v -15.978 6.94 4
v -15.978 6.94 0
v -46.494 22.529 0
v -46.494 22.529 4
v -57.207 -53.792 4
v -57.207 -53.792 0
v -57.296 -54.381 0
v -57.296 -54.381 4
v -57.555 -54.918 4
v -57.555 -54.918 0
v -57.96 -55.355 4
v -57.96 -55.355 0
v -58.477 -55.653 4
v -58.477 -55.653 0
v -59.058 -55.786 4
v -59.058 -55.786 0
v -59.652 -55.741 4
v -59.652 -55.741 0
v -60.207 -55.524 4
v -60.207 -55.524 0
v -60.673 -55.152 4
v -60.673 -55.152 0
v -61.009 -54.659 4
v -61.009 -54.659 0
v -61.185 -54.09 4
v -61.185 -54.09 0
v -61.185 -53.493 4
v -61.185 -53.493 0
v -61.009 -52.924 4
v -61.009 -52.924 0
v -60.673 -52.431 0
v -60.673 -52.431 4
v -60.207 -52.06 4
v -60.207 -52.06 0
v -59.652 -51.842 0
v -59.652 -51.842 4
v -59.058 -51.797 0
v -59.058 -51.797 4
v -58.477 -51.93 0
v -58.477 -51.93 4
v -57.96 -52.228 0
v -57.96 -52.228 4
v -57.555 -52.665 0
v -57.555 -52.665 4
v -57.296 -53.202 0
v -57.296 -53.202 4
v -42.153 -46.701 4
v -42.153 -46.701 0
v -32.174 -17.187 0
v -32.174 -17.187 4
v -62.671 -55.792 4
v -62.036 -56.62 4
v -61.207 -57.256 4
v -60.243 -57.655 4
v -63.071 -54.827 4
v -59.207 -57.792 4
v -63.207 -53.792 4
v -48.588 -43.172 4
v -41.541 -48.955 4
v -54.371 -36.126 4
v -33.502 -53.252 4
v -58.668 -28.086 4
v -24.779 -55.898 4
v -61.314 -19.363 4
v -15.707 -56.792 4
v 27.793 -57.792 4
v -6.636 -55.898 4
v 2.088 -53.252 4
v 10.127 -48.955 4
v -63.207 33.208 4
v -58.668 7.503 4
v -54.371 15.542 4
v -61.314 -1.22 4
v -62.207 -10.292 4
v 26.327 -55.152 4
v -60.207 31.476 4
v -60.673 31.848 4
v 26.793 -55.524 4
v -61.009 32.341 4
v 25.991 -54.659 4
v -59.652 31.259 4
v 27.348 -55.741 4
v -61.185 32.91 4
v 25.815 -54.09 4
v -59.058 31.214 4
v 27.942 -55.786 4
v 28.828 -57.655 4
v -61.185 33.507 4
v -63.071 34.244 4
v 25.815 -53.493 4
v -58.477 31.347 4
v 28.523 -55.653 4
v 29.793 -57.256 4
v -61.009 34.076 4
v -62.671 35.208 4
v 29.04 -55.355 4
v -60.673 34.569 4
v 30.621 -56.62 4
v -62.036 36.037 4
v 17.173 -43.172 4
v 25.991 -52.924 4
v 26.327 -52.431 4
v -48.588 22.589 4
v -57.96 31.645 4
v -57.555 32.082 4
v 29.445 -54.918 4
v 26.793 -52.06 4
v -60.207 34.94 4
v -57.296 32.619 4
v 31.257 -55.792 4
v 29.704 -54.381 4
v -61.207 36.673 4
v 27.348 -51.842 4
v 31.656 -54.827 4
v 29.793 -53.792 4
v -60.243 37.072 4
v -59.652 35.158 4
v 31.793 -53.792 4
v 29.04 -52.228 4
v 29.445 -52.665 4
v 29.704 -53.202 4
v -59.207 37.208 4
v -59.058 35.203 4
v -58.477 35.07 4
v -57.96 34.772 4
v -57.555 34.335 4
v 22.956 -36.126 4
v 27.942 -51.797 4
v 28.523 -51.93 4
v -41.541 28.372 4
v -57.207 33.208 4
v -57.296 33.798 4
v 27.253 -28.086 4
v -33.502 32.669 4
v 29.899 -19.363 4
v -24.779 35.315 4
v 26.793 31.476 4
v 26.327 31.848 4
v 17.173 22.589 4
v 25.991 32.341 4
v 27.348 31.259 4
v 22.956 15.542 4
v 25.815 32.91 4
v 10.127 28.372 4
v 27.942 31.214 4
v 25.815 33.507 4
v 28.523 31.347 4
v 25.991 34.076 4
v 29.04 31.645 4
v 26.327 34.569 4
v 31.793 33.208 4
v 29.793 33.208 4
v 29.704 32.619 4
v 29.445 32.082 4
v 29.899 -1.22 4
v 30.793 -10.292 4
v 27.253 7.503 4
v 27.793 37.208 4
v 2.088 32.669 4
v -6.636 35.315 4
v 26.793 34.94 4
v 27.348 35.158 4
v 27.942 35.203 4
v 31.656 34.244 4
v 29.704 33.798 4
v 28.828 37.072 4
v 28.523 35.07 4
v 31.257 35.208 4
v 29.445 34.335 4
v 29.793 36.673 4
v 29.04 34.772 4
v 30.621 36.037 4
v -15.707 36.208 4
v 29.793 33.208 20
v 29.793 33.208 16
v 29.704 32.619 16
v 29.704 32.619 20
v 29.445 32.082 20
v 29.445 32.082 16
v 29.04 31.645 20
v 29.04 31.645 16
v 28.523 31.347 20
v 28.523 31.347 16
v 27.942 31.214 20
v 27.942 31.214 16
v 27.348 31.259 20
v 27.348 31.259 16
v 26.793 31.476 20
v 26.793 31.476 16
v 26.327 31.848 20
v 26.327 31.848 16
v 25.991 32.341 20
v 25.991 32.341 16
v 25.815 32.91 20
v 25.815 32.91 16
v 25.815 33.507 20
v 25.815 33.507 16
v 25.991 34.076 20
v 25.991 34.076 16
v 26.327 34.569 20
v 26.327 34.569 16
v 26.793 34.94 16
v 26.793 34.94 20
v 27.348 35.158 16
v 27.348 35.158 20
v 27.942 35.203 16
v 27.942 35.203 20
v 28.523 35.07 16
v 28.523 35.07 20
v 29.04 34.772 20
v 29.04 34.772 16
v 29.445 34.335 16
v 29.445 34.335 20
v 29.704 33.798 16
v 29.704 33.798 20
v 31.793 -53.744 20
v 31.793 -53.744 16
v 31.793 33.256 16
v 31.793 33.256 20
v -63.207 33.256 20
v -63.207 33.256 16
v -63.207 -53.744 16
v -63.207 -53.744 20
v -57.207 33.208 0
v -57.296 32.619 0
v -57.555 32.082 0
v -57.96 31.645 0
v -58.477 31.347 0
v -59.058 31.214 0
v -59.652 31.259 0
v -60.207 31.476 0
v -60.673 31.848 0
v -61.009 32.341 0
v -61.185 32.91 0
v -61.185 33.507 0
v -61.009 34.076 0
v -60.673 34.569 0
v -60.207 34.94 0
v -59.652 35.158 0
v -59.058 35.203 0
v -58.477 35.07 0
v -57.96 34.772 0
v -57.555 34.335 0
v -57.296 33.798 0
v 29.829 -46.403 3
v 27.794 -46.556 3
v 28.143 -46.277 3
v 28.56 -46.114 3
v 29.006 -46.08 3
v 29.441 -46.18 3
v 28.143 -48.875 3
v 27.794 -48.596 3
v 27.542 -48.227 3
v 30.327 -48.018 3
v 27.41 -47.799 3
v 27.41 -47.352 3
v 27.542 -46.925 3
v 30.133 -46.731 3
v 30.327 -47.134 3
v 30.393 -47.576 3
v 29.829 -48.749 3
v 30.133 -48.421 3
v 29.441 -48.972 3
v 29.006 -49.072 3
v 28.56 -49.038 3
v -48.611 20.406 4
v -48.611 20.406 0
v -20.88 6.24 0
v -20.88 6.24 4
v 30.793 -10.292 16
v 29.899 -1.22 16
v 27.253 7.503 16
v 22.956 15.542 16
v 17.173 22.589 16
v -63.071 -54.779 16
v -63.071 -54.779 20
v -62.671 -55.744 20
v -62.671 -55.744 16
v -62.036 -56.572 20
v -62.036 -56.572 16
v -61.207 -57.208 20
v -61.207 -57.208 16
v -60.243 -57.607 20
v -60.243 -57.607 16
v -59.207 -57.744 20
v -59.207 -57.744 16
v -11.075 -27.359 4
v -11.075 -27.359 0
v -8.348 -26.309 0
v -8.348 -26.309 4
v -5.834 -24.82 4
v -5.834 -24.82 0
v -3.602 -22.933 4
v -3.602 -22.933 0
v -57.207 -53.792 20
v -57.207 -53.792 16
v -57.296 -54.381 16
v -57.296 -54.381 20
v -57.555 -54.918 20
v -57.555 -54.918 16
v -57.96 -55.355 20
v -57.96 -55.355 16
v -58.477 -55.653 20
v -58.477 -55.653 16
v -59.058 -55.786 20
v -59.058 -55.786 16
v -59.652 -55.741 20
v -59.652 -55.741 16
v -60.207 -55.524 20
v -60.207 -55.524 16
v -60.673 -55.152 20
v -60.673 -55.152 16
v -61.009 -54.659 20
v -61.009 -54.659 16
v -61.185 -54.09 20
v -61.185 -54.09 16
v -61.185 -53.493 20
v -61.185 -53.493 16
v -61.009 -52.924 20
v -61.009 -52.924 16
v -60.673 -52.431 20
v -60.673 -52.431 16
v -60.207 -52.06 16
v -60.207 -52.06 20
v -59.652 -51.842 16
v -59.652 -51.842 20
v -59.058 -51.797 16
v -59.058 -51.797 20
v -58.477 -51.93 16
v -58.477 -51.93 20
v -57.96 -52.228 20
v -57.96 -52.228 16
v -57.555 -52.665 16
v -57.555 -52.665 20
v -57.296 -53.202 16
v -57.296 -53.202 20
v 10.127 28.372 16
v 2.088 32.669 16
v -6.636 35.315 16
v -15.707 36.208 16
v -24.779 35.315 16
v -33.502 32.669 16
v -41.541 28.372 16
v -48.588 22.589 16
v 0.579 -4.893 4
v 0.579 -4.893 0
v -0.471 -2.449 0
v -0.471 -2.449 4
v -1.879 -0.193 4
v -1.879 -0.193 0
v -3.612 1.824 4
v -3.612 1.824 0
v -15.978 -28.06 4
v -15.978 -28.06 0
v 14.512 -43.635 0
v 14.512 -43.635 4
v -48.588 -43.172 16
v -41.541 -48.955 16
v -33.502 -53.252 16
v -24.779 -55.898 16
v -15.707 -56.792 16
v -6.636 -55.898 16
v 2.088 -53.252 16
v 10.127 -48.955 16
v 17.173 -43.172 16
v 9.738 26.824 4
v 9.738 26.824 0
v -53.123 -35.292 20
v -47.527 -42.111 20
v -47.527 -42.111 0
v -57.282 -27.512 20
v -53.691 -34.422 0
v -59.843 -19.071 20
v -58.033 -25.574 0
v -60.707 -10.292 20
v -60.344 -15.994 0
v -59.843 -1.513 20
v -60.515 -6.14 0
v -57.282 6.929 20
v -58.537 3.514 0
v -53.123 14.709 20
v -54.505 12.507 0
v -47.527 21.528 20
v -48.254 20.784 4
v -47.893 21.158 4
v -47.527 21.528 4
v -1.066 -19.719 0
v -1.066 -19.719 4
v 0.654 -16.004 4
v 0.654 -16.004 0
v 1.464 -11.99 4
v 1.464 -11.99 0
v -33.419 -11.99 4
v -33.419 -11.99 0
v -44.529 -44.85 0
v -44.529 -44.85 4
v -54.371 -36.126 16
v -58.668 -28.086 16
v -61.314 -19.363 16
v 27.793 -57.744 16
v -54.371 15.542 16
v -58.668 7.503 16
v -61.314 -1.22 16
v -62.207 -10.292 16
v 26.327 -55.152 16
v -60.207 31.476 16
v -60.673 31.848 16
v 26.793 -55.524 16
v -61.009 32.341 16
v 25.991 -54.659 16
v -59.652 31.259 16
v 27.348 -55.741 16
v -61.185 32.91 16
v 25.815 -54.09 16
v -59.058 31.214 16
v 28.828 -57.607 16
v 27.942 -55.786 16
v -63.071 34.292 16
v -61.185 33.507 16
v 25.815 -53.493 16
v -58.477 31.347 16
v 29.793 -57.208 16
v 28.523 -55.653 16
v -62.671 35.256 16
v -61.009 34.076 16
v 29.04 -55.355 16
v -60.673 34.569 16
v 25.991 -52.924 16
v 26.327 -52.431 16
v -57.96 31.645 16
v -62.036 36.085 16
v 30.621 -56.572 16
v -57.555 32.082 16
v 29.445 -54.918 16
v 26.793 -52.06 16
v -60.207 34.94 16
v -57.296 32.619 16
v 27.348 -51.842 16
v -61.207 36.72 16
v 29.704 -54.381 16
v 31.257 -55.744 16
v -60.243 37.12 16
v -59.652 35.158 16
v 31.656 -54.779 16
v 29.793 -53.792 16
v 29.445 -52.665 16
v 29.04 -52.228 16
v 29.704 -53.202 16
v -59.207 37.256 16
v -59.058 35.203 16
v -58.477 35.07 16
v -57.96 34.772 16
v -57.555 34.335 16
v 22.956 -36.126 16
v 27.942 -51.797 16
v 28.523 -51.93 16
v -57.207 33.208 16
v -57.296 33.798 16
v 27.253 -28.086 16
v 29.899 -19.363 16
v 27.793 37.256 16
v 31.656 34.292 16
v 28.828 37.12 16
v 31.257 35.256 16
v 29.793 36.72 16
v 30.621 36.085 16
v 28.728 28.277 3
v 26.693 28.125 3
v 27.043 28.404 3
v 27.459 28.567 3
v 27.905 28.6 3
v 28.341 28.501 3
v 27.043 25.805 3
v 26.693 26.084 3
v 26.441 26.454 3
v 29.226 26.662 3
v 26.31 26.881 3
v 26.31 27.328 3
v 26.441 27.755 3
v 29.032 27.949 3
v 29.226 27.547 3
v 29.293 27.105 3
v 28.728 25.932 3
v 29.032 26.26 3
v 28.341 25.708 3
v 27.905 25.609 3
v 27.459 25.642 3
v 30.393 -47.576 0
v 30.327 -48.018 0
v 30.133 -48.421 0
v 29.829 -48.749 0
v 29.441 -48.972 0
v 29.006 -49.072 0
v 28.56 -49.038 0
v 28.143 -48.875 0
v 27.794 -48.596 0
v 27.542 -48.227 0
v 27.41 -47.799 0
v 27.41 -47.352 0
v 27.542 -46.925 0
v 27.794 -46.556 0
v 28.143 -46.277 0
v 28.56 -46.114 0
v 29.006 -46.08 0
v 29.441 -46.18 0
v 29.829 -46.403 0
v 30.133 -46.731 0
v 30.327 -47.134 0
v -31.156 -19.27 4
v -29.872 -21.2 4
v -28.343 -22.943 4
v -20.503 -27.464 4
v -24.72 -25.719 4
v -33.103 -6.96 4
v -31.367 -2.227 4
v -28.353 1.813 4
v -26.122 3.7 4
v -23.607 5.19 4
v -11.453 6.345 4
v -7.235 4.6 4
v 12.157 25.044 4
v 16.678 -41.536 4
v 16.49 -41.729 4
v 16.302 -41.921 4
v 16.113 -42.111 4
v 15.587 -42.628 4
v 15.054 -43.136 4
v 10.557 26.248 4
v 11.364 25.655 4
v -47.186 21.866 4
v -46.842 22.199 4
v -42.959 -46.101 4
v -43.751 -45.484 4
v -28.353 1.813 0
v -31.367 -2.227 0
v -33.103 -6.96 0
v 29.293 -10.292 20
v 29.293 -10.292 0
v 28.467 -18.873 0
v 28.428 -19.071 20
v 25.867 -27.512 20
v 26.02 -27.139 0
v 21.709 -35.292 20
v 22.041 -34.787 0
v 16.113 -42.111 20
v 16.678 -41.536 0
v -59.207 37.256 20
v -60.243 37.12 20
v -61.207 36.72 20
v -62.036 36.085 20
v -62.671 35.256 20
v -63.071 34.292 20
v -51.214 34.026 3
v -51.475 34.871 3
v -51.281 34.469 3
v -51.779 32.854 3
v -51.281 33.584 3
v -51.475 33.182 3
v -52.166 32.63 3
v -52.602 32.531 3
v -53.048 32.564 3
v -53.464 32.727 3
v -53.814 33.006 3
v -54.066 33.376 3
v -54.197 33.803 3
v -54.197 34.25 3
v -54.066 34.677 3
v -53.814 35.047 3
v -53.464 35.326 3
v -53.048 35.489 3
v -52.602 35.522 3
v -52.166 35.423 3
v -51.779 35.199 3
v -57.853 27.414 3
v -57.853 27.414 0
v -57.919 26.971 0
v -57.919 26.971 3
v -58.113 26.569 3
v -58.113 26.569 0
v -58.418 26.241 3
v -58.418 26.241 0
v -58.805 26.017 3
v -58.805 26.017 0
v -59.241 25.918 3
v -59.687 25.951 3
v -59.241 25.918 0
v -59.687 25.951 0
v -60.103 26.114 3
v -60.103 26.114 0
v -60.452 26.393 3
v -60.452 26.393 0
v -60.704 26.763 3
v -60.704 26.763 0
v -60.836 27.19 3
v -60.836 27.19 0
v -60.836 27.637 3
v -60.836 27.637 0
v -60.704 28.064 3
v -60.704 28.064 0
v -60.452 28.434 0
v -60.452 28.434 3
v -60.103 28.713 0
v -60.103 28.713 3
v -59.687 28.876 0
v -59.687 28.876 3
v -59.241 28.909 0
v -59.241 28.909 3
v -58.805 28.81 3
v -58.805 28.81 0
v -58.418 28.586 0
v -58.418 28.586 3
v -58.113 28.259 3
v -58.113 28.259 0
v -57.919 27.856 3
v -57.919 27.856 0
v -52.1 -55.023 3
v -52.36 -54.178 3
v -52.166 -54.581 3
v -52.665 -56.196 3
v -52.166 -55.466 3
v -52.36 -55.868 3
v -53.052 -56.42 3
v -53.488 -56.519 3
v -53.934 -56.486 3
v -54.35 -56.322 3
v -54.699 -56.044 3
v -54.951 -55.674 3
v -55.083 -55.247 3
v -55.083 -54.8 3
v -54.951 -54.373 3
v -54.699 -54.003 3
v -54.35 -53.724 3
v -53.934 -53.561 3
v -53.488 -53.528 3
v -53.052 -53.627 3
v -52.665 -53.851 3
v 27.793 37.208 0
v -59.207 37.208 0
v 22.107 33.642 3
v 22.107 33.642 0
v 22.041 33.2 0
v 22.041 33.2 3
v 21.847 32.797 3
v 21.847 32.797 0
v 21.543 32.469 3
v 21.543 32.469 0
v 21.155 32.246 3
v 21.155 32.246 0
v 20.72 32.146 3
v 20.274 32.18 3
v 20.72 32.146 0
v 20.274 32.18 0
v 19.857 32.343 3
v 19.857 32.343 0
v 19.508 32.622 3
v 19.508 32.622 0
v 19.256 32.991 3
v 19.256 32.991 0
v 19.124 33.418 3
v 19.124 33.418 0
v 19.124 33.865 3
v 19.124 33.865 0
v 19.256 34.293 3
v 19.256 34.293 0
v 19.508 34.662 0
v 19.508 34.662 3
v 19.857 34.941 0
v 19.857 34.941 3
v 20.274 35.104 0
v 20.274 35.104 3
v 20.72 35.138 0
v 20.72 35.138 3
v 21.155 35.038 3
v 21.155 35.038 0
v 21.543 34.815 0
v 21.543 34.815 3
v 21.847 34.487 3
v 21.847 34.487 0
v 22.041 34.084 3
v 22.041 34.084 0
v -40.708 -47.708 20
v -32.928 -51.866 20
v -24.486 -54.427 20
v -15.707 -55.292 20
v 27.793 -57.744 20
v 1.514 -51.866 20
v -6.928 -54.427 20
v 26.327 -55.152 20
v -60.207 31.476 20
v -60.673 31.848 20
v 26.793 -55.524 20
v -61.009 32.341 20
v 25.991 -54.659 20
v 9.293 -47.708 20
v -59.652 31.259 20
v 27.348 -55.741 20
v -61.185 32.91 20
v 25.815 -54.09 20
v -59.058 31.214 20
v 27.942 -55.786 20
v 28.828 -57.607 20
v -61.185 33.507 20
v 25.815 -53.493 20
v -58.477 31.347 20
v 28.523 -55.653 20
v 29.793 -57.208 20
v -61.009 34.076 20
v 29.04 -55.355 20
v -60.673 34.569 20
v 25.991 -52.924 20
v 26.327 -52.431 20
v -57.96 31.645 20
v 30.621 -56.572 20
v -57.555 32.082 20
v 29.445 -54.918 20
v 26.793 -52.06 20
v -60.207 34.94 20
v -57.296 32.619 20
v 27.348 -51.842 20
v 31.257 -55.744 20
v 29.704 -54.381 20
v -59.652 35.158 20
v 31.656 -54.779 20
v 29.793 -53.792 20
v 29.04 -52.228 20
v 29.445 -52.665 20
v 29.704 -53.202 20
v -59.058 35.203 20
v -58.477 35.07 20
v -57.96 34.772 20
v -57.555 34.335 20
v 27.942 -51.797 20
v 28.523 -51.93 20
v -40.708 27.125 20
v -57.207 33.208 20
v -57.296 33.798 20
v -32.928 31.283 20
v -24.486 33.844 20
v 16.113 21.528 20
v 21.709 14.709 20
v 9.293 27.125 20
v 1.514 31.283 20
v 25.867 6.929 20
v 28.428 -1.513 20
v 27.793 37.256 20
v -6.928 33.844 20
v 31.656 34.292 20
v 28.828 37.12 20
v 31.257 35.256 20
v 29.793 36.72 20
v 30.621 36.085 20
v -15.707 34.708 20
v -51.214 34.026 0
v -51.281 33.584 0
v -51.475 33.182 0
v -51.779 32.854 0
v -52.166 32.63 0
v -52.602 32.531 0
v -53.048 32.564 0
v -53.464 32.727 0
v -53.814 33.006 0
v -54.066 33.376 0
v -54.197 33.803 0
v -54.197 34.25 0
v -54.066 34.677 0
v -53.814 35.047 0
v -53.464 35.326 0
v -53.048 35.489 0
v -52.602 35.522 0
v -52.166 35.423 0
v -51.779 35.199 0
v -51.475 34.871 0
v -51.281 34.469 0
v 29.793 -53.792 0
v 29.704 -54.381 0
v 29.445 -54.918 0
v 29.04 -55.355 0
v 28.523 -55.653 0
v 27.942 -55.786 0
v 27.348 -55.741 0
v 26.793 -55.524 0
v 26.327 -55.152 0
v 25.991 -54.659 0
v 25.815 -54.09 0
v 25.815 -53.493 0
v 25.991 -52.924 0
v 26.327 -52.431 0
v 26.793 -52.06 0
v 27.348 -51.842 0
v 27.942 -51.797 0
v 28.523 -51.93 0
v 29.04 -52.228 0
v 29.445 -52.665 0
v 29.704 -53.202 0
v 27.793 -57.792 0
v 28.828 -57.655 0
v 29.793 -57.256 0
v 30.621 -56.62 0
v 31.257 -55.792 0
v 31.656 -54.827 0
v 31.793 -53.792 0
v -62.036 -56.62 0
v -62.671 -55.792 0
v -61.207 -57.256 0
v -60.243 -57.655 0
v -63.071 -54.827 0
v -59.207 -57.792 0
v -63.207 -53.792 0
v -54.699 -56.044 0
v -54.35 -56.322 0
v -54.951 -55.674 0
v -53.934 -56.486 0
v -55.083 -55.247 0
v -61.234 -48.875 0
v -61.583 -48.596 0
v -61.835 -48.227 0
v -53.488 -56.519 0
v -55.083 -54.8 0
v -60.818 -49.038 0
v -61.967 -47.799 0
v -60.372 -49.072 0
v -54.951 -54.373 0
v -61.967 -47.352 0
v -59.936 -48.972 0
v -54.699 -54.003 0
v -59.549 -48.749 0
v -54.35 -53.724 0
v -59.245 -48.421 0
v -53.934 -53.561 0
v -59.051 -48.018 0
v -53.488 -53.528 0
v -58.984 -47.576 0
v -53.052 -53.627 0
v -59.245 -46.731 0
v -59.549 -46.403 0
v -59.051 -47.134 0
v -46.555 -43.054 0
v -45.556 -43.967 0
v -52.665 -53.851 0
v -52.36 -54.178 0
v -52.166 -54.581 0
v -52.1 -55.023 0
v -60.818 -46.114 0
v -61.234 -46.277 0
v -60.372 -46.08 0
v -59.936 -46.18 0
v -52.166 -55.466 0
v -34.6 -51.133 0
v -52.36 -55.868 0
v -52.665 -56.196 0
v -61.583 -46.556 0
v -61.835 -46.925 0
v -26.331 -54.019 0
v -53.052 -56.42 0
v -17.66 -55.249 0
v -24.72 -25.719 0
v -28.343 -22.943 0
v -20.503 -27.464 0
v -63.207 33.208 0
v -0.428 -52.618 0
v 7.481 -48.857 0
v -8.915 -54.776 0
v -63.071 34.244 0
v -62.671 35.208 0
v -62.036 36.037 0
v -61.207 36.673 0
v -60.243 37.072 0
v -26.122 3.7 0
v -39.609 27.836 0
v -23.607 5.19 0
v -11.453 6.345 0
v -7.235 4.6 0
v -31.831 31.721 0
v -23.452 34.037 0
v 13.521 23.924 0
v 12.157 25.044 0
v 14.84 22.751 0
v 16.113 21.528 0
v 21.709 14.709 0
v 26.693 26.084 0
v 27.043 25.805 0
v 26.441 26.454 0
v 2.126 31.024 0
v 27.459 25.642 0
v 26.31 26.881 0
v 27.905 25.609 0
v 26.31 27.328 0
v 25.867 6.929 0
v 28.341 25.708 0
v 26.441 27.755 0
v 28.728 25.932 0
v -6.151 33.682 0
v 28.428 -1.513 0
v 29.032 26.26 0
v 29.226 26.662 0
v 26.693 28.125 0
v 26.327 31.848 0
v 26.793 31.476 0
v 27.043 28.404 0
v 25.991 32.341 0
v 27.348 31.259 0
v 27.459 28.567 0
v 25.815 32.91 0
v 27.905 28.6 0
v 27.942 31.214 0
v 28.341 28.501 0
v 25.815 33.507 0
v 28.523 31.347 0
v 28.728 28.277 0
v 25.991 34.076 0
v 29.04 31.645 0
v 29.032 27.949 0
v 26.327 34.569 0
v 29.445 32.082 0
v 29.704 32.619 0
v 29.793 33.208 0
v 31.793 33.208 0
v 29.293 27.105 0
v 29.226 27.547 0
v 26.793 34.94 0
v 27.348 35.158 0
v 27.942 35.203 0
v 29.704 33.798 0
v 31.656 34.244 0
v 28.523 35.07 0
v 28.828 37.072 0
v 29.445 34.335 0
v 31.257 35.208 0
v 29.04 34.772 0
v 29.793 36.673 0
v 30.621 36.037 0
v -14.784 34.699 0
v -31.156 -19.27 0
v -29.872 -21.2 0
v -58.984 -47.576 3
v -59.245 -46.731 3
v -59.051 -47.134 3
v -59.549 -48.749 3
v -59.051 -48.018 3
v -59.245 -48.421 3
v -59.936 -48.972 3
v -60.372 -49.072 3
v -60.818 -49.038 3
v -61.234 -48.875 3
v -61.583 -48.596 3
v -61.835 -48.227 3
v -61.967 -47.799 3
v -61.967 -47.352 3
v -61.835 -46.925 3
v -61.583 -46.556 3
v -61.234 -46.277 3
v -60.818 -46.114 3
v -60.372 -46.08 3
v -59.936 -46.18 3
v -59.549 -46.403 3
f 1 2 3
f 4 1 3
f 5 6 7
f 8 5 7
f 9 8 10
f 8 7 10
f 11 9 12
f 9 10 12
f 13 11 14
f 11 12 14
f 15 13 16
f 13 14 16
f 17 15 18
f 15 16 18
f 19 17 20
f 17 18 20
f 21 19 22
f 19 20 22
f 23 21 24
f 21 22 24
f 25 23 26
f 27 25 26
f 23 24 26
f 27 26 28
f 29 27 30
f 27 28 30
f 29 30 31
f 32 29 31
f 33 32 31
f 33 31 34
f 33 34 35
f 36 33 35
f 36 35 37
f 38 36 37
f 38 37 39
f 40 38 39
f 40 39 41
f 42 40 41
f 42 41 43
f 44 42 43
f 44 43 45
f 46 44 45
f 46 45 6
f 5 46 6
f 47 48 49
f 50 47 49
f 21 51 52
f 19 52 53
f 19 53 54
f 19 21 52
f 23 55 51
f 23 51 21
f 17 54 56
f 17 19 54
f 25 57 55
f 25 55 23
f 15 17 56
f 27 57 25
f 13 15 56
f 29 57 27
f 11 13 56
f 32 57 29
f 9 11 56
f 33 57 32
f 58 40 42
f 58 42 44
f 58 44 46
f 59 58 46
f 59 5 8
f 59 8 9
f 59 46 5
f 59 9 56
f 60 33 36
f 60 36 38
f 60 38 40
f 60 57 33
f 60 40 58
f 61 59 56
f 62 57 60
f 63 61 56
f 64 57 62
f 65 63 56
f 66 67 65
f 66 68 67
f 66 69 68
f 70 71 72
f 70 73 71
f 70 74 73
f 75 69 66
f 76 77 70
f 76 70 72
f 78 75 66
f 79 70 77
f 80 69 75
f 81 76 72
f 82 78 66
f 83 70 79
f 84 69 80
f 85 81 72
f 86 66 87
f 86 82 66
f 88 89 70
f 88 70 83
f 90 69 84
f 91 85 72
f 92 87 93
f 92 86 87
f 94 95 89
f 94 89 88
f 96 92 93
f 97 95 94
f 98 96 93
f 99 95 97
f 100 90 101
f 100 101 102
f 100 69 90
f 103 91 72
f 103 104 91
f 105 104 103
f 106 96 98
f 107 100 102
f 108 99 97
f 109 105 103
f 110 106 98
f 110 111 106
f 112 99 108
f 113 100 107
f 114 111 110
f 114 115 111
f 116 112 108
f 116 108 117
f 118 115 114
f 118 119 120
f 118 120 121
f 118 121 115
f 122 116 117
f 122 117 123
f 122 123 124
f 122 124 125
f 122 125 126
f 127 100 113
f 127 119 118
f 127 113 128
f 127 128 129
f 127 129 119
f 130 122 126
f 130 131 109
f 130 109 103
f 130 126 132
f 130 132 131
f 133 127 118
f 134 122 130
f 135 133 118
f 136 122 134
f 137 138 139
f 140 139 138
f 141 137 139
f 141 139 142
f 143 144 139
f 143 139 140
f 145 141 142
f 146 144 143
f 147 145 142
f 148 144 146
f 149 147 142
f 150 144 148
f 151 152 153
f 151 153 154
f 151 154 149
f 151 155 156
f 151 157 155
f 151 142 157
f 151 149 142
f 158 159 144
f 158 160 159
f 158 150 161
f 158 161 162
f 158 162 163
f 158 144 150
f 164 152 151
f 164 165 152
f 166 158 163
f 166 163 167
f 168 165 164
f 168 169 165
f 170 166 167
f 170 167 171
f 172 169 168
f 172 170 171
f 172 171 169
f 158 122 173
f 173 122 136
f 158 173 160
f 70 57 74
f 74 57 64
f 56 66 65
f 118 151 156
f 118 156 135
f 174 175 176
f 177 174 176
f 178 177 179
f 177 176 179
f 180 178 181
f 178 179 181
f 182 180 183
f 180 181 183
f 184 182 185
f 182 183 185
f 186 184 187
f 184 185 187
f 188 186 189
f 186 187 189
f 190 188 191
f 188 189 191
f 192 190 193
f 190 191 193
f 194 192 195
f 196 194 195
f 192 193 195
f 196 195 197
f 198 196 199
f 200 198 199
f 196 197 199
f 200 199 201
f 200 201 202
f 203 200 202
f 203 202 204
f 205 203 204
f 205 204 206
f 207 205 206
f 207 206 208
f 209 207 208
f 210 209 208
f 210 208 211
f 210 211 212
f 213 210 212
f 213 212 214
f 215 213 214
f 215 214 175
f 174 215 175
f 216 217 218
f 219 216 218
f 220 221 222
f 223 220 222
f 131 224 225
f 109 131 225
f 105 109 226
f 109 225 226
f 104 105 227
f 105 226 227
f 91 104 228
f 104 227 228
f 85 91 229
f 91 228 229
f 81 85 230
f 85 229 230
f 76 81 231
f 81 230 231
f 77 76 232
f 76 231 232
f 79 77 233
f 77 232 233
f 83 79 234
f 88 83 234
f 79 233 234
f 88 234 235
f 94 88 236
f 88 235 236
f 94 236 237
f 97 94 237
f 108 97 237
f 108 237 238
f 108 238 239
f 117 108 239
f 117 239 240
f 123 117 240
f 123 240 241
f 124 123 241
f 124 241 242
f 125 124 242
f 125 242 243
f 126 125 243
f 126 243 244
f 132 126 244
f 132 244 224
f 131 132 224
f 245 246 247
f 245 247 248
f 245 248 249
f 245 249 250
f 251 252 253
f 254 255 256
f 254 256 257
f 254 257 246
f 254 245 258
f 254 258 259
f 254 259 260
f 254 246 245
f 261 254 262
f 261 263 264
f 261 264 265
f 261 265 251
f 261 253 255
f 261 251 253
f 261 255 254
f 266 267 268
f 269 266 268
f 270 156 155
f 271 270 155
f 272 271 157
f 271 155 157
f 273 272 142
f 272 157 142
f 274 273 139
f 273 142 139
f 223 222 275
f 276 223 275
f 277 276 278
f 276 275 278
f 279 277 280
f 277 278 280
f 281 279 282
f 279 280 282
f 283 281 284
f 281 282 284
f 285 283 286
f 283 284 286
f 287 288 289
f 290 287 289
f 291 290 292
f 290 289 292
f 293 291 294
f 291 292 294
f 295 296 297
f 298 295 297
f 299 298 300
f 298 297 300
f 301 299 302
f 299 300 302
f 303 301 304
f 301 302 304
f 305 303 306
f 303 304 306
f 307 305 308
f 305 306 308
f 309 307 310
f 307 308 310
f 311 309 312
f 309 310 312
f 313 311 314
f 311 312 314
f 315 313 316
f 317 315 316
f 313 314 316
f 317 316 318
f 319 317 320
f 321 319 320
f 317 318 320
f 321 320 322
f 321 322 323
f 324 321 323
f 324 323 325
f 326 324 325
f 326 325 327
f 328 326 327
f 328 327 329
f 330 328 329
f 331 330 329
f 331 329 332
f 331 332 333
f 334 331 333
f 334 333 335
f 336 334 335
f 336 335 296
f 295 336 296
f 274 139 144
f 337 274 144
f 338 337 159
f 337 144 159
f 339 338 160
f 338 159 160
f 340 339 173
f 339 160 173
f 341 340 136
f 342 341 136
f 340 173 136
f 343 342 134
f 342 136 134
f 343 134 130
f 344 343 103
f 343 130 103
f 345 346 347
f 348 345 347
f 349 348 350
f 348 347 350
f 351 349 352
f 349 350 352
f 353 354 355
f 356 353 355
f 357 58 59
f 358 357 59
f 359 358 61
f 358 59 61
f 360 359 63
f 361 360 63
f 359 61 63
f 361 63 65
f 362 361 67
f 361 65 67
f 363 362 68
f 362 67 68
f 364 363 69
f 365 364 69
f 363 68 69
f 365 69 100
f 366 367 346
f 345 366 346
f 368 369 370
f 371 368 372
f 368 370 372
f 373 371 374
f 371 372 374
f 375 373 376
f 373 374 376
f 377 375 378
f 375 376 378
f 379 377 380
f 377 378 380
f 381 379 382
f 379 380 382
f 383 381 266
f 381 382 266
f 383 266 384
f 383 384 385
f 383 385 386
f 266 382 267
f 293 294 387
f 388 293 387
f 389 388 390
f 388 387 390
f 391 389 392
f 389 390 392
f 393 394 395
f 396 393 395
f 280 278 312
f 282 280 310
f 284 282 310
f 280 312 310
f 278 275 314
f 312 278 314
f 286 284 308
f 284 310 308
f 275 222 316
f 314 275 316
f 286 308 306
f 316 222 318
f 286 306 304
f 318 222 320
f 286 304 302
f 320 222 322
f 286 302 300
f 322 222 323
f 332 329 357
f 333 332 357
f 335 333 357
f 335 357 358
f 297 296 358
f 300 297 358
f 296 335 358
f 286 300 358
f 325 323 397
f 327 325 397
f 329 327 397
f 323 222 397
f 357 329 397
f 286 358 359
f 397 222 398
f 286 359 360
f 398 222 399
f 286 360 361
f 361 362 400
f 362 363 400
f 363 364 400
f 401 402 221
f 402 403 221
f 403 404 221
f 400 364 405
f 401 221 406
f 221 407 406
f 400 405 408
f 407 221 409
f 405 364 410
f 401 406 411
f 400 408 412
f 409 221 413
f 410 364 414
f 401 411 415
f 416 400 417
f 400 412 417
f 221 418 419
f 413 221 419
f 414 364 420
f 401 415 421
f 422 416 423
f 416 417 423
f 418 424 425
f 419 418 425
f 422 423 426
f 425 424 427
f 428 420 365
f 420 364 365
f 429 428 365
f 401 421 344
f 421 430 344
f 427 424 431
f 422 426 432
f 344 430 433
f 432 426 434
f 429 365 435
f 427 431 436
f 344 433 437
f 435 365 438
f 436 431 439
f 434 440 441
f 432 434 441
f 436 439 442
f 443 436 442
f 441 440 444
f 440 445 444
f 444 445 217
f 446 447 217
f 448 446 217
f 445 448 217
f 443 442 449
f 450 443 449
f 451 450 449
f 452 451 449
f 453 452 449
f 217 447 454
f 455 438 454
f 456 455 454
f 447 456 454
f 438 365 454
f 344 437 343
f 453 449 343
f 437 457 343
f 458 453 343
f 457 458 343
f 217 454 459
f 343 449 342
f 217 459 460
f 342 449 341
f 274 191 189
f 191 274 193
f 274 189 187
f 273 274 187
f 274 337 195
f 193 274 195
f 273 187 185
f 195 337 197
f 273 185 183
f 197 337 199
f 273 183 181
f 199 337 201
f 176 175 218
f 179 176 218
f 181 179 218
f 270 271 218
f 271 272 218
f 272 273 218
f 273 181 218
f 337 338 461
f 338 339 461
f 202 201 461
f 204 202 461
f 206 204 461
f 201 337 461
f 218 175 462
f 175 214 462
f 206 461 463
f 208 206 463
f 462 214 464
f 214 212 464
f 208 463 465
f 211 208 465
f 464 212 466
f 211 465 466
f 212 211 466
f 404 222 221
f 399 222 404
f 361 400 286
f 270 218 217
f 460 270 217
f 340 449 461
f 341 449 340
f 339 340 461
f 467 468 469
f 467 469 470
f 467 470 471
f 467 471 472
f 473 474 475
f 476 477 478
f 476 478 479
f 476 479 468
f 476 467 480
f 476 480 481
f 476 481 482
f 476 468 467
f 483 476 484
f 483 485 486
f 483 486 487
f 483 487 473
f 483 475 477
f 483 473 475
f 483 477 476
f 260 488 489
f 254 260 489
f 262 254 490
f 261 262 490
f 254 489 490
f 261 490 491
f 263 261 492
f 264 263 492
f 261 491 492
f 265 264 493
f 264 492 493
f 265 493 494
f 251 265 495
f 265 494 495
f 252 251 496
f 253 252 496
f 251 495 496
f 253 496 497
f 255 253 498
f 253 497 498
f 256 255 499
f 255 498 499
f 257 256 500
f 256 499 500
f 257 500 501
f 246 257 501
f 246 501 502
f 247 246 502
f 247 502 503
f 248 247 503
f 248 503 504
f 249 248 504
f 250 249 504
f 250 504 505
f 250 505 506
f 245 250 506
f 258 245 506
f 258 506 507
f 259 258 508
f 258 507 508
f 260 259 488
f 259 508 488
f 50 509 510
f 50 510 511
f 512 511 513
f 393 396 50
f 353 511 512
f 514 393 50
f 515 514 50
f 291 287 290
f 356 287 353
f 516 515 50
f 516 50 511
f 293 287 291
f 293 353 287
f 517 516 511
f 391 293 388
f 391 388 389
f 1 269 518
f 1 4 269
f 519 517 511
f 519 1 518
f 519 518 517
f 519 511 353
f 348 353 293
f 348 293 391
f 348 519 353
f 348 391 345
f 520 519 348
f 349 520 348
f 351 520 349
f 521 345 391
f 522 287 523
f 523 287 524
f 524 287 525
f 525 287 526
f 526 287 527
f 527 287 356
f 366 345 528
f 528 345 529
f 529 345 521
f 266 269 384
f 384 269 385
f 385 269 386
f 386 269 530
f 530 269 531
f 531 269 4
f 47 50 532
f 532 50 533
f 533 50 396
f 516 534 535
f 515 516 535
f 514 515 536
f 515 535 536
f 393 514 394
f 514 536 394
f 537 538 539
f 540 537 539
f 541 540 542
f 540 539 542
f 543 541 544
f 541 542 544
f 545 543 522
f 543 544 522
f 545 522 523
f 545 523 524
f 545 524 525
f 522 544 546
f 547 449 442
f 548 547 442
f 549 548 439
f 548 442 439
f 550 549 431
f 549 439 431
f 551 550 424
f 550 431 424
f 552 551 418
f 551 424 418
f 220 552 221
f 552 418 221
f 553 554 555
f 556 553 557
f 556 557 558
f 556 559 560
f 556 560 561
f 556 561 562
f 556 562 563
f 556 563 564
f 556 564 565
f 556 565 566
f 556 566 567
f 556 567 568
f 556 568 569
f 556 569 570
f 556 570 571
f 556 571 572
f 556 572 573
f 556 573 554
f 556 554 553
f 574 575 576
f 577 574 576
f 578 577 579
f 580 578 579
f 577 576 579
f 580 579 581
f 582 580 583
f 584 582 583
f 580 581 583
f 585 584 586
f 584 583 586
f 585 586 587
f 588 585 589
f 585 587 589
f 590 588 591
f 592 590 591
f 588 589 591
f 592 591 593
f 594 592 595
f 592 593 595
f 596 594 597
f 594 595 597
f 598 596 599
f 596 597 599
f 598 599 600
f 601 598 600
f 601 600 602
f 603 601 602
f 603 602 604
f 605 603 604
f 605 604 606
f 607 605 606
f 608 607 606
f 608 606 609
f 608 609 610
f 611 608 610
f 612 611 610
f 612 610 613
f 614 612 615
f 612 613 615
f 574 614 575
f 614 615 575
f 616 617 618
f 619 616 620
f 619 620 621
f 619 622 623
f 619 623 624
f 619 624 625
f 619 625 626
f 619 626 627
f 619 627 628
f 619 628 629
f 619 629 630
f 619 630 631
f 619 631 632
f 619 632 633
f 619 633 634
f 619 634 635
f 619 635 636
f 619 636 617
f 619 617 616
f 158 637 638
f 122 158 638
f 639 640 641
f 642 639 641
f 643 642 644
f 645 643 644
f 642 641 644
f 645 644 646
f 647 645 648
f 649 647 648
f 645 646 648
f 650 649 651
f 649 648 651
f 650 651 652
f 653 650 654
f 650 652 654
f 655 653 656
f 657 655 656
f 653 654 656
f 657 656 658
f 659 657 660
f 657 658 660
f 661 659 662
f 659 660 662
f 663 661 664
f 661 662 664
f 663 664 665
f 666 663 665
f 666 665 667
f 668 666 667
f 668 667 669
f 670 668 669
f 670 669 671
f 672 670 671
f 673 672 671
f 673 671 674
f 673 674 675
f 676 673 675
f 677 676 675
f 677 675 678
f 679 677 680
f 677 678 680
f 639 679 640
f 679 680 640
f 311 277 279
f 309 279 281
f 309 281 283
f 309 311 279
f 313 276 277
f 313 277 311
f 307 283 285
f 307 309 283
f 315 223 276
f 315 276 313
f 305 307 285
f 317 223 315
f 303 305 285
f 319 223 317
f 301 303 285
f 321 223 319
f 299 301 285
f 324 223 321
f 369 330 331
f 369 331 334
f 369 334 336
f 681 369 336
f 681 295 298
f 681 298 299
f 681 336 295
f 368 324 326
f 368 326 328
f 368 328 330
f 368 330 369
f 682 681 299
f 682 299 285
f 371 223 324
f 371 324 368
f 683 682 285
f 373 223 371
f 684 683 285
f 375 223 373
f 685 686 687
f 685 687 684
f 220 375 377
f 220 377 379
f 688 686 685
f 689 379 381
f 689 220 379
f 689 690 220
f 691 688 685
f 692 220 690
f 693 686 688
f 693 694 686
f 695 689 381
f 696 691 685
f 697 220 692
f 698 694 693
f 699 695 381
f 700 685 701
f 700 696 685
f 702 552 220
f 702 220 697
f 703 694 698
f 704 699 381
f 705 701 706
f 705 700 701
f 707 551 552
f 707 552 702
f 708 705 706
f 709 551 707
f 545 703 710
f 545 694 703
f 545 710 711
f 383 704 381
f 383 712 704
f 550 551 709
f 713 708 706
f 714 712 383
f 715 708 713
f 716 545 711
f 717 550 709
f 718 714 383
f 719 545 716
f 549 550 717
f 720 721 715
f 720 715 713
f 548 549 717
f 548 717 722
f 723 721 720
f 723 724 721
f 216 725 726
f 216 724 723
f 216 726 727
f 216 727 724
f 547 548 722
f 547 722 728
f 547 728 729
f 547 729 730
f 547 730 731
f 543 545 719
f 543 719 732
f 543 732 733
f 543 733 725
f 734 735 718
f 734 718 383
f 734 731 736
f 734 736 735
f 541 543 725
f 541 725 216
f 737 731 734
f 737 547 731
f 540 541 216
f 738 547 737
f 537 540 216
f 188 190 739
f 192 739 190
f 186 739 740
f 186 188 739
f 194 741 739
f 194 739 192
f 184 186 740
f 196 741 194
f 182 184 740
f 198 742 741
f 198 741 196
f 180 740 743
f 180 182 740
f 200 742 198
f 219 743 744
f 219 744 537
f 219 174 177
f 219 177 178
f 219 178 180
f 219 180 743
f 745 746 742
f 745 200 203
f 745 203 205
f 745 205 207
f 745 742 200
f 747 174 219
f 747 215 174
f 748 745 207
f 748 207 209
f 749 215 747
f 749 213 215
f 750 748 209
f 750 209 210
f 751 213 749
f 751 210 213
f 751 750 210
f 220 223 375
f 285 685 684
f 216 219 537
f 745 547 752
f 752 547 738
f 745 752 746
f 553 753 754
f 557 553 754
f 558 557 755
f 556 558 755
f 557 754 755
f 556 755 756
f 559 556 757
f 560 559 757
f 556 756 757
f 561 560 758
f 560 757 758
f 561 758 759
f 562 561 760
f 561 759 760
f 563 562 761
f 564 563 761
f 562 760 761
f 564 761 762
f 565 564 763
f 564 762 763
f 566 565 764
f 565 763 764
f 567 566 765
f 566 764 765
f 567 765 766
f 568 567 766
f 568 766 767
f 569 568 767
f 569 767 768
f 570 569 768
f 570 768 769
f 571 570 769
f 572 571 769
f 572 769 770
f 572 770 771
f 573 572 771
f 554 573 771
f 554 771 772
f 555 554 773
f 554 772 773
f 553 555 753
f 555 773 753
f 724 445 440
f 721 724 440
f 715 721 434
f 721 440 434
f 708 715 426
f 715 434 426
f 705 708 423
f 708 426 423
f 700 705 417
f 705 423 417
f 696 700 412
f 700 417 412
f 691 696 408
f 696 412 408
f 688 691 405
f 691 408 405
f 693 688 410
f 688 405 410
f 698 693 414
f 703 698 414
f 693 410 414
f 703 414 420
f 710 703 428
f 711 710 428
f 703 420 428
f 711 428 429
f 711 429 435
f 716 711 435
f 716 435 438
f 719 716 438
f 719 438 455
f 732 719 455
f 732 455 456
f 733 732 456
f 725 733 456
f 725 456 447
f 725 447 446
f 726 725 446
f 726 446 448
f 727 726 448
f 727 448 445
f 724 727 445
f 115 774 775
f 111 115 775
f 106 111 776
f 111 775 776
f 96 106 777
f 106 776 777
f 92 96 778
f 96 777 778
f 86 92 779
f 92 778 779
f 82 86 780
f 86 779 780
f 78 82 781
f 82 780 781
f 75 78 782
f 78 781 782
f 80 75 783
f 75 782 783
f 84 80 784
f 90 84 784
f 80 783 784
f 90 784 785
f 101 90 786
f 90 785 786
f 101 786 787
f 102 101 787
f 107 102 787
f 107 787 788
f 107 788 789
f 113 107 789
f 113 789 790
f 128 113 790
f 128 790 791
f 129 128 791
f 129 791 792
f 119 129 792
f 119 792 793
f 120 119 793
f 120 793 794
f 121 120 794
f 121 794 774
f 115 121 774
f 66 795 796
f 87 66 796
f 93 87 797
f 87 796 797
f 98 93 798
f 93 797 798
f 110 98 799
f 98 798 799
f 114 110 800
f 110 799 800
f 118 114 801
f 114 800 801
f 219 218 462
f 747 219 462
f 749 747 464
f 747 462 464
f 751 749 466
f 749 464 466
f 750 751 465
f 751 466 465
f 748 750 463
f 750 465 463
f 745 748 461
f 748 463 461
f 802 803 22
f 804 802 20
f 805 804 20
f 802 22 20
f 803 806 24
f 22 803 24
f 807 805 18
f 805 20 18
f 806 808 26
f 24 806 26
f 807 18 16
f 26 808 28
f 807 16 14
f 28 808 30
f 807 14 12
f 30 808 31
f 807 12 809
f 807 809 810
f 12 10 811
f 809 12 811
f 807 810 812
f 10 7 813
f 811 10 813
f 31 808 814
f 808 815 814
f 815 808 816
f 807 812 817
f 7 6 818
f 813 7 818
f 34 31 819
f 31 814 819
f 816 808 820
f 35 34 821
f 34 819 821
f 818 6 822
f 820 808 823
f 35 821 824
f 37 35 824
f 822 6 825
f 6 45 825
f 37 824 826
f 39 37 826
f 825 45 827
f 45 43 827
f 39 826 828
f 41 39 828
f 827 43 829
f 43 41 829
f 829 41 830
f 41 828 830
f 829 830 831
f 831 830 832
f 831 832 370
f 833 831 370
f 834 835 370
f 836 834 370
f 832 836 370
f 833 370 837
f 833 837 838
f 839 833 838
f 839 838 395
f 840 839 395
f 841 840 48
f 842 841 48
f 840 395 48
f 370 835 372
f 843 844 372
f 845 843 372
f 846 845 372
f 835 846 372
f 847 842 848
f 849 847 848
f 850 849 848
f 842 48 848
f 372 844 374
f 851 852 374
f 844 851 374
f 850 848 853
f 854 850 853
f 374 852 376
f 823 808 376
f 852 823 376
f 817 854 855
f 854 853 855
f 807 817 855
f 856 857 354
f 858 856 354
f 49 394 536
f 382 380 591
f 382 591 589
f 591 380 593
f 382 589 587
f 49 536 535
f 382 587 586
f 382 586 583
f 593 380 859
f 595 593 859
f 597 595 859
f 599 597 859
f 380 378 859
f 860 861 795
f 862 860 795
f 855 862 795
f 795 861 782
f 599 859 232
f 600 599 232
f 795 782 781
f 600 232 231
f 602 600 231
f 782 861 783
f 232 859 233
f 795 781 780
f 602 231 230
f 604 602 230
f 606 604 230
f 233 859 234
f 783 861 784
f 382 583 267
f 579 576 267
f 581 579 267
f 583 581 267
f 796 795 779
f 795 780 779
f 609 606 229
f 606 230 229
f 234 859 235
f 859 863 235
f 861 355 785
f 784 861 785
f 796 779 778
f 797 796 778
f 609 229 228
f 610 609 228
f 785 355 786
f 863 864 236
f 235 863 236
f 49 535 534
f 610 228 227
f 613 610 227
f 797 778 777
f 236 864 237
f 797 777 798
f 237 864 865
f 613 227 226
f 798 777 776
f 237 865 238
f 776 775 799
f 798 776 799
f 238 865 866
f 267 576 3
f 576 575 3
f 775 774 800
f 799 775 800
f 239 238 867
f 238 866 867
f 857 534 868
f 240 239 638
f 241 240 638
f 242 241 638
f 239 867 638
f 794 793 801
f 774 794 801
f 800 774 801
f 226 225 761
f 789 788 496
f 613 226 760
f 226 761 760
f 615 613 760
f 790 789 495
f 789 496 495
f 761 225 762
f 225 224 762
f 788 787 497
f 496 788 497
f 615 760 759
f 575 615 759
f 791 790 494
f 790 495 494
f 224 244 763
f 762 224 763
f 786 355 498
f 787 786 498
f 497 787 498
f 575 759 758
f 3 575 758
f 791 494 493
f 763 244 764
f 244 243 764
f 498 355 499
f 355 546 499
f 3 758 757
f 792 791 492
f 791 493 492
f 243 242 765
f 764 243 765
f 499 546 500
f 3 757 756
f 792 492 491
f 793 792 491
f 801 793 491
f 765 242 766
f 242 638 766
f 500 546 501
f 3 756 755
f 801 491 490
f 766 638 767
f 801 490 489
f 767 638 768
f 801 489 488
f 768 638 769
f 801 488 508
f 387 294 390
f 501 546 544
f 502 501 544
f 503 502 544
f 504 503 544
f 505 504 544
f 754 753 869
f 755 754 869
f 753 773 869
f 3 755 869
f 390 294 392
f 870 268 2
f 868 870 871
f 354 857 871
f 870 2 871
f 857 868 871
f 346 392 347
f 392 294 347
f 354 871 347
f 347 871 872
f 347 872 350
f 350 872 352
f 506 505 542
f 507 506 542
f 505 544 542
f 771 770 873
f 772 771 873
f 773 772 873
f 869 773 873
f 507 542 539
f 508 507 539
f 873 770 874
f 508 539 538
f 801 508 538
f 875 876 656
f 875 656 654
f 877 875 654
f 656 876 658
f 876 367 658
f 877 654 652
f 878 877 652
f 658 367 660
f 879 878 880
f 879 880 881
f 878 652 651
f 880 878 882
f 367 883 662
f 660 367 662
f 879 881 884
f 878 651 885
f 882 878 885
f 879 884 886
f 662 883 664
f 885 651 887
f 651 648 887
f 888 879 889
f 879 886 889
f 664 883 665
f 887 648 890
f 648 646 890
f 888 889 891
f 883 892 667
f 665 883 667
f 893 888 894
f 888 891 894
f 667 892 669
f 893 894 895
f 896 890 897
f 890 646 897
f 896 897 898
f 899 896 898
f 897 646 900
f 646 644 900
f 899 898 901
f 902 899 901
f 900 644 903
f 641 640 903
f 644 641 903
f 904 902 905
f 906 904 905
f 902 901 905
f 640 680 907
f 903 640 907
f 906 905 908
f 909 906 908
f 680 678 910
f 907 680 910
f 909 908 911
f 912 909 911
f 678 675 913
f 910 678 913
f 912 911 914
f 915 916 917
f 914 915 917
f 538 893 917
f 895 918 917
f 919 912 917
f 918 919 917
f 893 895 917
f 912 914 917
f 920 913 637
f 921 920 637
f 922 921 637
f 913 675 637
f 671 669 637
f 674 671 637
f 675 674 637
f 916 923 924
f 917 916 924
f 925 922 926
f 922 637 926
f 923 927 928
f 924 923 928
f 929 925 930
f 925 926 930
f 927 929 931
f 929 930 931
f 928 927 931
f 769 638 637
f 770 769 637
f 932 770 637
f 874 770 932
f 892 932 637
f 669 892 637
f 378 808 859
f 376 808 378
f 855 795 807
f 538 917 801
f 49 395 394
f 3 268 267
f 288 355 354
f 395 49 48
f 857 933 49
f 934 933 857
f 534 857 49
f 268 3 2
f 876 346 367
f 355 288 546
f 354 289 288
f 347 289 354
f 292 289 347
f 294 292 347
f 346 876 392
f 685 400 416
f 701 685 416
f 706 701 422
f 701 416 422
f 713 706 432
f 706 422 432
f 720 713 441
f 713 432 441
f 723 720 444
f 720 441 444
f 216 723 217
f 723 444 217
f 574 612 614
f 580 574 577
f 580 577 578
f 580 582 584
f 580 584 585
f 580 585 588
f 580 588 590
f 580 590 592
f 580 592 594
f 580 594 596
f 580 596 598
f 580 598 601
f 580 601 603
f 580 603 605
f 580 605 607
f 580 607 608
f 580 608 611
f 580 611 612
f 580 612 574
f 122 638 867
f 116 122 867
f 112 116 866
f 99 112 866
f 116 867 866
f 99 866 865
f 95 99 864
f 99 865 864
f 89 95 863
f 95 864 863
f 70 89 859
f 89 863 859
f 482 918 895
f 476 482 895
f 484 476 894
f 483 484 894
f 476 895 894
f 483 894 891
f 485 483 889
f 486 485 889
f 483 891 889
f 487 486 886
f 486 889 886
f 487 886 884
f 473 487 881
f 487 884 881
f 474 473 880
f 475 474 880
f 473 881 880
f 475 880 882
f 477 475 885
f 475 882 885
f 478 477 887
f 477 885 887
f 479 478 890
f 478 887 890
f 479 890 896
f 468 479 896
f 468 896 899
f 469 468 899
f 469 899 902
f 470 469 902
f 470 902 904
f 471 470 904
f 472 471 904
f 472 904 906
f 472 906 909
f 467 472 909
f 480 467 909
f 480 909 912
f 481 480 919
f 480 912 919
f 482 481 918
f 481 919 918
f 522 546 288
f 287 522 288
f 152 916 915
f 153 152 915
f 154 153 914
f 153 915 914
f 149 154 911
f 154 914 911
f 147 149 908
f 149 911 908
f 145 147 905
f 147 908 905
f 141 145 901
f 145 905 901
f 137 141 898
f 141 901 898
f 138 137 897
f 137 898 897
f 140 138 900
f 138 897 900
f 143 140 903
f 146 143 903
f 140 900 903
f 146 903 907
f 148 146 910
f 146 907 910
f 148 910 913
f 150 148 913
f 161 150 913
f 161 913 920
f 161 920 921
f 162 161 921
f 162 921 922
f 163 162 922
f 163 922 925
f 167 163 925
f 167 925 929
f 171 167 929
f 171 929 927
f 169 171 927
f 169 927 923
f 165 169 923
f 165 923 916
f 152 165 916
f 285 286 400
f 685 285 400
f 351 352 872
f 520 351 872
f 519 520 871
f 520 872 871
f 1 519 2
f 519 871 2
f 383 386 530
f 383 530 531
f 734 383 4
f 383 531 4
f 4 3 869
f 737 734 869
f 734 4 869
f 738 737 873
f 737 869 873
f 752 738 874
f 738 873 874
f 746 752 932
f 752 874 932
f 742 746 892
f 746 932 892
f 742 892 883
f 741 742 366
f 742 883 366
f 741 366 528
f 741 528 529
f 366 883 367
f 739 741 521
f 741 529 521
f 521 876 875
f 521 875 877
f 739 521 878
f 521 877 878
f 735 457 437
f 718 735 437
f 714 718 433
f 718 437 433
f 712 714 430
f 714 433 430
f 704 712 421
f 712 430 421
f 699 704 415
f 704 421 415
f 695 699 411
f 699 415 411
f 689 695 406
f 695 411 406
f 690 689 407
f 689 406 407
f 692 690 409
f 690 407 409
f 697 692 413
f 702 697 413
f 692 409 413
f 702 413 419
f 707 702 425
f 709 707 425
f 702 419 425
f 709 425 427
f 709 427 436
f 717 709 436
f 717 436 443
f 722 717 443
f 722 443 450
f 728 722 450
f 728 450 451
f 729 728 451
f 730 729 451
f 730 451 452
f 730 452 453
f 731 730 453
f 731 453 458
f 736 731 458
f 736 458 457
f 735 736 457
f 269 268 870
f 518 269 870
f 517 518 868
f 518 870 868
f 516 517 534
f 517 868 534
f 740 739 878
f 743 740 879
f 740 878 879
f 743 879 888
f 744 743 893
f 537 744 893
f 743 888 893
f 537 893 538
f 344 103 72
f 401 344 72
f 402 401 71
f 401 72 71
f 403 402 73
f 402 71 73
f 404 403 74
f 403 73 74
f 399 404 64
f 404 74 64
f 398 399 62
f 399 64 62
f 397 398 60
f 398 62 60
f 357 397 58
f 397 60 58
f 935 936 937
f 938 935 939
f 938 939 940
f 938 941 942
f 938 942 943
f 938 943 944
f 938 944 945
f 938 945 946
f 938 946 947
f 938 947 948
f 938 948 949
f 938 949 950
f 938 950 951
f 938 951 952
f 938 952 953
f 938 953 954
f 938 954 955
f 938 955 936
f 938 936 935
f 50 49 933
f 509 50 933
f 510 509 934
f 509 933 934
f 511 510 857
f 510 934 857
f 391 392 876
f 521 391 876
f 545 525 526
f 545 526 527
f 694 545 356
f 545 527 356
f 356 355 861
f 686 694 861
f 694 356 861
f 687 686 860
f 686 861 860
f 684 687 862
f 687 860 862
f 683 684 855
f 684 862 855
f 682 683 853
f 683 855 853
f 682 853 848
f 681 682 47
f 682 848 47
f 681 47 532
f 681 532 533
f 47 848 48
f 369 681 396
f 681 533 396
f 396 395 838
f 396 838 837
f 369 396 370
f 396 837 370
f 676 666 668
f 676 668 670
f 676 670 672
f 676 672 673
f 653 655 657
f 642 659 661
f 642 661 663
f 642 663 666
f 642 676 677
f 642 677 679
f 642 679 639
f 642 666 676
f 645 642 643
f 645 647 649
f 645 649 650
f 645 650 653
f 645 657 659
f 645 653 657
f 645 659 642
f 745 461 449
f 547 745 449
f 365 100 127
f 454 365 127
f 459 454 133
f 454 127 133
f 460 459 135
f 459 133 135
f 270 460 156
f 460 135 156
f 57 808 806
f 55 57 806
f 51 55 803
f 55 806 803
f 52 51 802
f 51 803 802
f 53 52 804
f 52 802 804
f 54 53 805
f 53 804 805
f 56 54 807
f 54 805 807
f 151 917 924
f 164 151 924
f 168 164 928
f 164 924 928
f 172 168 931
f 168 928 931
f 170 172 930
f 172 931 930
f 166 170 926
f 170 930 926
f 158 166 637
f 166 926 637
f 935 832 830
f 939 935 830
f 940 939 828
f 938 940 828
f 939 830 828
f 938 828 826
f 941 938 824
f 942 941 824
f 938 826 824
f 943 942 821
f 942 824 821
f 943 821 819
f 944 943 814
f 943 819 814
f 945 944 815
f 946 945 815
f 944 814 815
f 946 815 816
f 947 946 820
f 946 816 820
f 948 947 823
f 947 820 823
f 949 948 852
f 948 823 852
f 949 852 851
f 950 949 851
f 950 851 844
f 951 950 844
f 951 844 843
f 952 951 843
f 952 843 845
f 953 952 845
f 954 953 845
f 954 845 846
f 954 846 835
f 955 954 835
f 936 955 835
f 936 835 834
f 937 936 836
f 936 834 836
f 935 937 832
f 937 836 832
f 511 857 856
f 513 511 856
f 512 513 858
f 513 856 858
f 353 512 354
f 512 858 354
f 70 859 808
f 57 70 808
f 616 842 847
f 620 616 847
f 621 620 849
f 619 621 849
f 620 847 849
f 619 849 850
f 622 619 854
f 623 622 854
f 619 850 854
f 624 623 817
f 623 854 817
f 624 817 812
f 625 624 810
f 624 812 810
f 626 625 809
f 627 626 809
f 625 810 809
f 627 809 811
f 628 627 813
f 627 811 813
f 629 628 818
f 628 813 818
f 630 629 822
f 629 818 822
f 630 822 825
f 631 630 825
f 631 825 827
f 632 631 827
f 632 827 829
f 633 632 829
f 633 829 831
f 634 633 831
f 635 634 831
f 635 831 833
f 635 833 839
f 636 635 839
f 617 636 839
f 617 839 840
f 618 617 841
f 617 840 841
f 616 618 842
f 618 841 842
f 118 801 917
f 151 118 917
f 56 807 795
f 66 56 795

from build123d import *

# Parameters (mm, degrees)
F1_DEPTH  = 4
F3_DEPTH  = 12
F7_DEPTH  = 4
F8_DEPTH  = 25
F9_R      = 2
F10_DEPTH = 25
F12_DEPTH = 4
F13_R     = 1.5
F14_DEPTH = 3


with BuildPart() as f1:
    # F0 (on Top) → F1 (new body)
    with BuildSketch(Plane.XY):
        with BuildLine():
            Line((27.792761, 37.208434), (-59.207239, 37.208434))
            ThreePointArc((-59.207239, 37.208434), (-62.035666, 36.036861), (-63.207239, 33.208434))
            Line((-63.207239, 33.208434), (-63.207239, -53.791566))
            ThreePointArc((-63.207239, -53.791566), (-62.035666, -56.619993), (-59.207239, -57.791566))
            Line((-59.207239, -57.791566), (27.792761, -57.791566))
            ThreePointArc((27.792761, -57.791566), (30.621188, -56.619993), (31.792761, -53.791566))
            Line((31.792761, -53.791566), (31.792761, 33.208434))
            ThreePointArc((31.792761, 33.208434), (30.621188, 36.036861), (27.792761, 37.208434))
        make_face()
    extrude(amount=F1_DEPTH)

    # F2 (on face) → F3 (join)
    with BuildSketch(Plane.XY.offset(4)):
        with BuildLine():
            ThreePointArc((30.792761, -10.291566), (27.253159, 7.503214), (17.173226, 22.5889))
            Line((17.173226, 22.5889), (-15.707239, -10.291566))
            Line((-15.707239, -10.291566), (17.173226, -43.172031))
            ThreePointArc((17.173226, -43.172031), (27.253159, -28.086345), (30.792761, -10.291566))
        make_face()
        with BuildLine():
            Line((-15.707239, -10.291566), (17.173226, 22.5889))
            ThreePointArc((17.173226, 22.5889), (-15.707239, 36.208434), (-48.587704, 22.5889))
            Line((-48.587704, 22.5889), (-15.707239, -10.291566))
        make_face()
        with BuildLine():
            Line((17.173226, -43.172031), (-15.707239, -10.291566))
            Line((-15.707239, -10.291566), (-48.587704, -43.172031))
            ThreePointArc((-48.587704, -43.172031), (-15.707239, -56.791566), (17.173226, -43.172031))
        make_face()
        with BuildLine():
            Line((-48.587704, -43.172031), (-15.707239, -10.291566))
            Line((-15.707239, -10.291566), (-48.587704, 22.5889))
            ThreePointArc((-48.587704, 22.5889), (-62.207239, -10.291566), (-48.587704, -43.172031))
        make_face()
    extrude(amount=F3_DEPTH)

    # F6 (on offset) → F7 (join)
    with BuildSketch(Plane.XY.offset(16)):
        with BuildLine():
            ThreePointArc((-59.207239, 37.256276), (-62.035666, 36.084703), (-63.207239, 33.256276))
            Line((-63.207239, 33.256276), (-63.207239, -53.743724))
            ThreePointArc((-63.207239, -53.743724), (-62.035666, -56.572152), (-59.207239, -57.743724))
            Line((-59.207239, -57.743724), (27.792761, -57.743724))
            ThreePointArc((27.792761, -57.743724), (30.621188, -56.572152), (31.792761, -53.743724))
            Line((31.792761, -53.743724), (31.792761, 33.256276))
            ThreePointArc((31.792761, 33.256276), (30.621188, 36.084703), (27.792761, 37.256276))
            Line((27.792761, 37.256276), (-59.207239, 37.256276))
        make_face()
    extrude(amount=F7_DEPTH)

    # F4 (on face) → F8 (cut)
    with BuildSketch(Plane(origin=(0, 0, 0), x_dir=(1, 0, 0), z_dir=(0, 0, -1))):
        with BuildLine():
            ThreePointArc((16.112566, 42.111371), (-15.707239, 55.291566), (-47.527044, 42.111371))
            Line((-47.527044, 42.111371), (-15.707239, 10.291566))
            Line((-15.707239, 10.291566), (16.112566, 42.111371))
        make_face()
        with BuildLine():
            Line((-15.707239, 10.291566), (-47.527044, 42.111371))
            ThreePointArc((-47.527044, 42.111371), (-60.707239, 10.291566), (-47.527044, -21.528239))
            Line((-47.527044, -21.528239), (-15.707239, 10.291566))
        make_face()
        with BuildLine():
            Line((16.112566, 42.111371), (-15.707239, 10.291566))
            Line((-15.707239, 10.291566), (16.112566, -21.528239))
            ThreePointArc((16.112566, -21.528239), (25.86734, -6.929189), (29.292761, 10.291566))
            ThreePointArc((29.292761, 10.291566), (25.86734, 27.51232), (16.112566, 42.111371))
        make_face()
        with BuildLine():
            Line((16.112566, -21.528239), (-15.707239, 10.291566))
            Line((-15.707239, 10.291566), (-47.527044, -21.528239))
            ThreePointArc((-47.527044, -21.528239), (-15.707239, -34.708434), (16.112566, -21.528239))
        make_face()
    extrude(amount=-F8_DEPTH, mode=Mode.SUBTRACT)

    # F9 (on face) → F10 (cut)
    with BuildSketch(Plane(origin=(0, 0, 0), x_dir=(1, 0, 0), z_dir=(0, 0, -1))):
        with Locations((27.792761, 53.791566)):
            Circle(F9_R)
        with Locations((27.792761, -33.208434)):
            Circle(F9_R)
        with Locations((-59.207239, 53.791566)):
            Circle(F9_R)
        with Locations((-59.207239, -33.208434)):
            Circle(F9_R)
    extrude(amount=-F10_DEPTH, mode=Mode.SUBTRACT)

    # F11 (on Top) → F12 (join)
    with BuildSketch(Plane.XY):
        with BuildLine():
            ThreePointArc((-11.075309, -27.358951), (-7.059758, -25.616863), (-3.602133, -22.932771))
            Line((-3.602133, -22.932771), (-15.977767, -10.559668))
            Line((-15.977767, -10.559668), (-28.343116, -22.94305))
            ThreePointArc((-28.343116, -22.94305), (-22.668837, -26.729999), (-15.977767, -28.059668))
            ThreePointArc((-15.977767, -28.059668), (-13.501626, -27.883603), (-11.075309, -27.358951))
        make_face()
        with BuildLine():
            Line((-15.977767, -10.559668), (-3.602133, -22.932771))
            ThreePointArc((-3.602133, -22.932771), (-0.097014, -17.911653), (1.463653, -11.990353))
            ThreePointArc((1.463653, -11.990353), (1.507582, -11.27561), (1.522233, -10.559668))
            ThreePointArc((1.522233, -10.559668), (1.284893, -7.687292), (0.579313, -4.892827))
            ThreePointArc((0.579313, -4.892827), (-1.131734, -1.294395), (-3.612418, 1.823714))
            Line((-3.612418, 1.823714), (-15.977767, -10.559668))
        make_face()
        with BuildLine():
            Line((-28.343116, -22.94305), (-15.977767, -10.559668))
            Line((-15.977767, -10.559668), (-28.353402, 1.813434))
            ThreePointArc((-28.353402, 1.813434), (-32.406411, -4.530599), (-33.419188, -11.990353))
            ThreePointArc((-33.419188, -11.990353), (-32.996271, -14.636499), (-32.174304, -17.187051))
            ThreePointArc((-32.174304, -17.187051), (-30.545822, -20.256152), (-28.343116, -22.94305))
        make_face()
        with BuildLine():
            Line((-28.353402, 1.813434), (-15.977767, -10.559668))
            Line((-15.977767, -10.559668), (-3.612418, 1.823714))
            ThreePointArc((-3.612418, 1.823714), (-9.286698, 5.610662), (-15.977767, 6.940332))
            ThreePointArc((-15.977767, 6.940332), (-18.453909, 6.764267), (-20.880226, 6.239615))
            ThreePointArc((-20.880226, 6.239615), (-24.895777, 4.497526), (-28.353402, 1.813434))
        make_face()
        with BuildLine():
            Line((17.595724, -42.005187), (-11.075309, -27.358951))
            ThreePointArc((-11.075309, -27.358951), (-13.501626, -27.883603), (-15.977767, -28.059668))
            Line((-15.977767, -28.059668), (15.474621, -44.126725))
            Line((15.474621, -44.126725), (17.595724, -42.005187))
        make_face()
        with BuildLine():
            ThreePointArc((1.522233, -10.559668), (1.507582, -11.27561), (1.463653, -11.990353))
            Line((1.463653, -11.990353), (12.343387, 25.688259))
            Line((12.343387, 25.688259), (9.920419, 27.457222))
            Line((9.920419, 27.457222), (0.579313, -4.892827))
            ThreePointArc((0.579313, -4.892827), (1.284893, -7.687292), (1.522233, -10.559668))
        make_face()
        with BuildLine():
            ThreePointArc((15.474621, -44.126725), (16.552472, -43.083252), (17.595724, -42.005187))
            Line((17.595724, -42.005187), (15.474621, -44.126725))
        make_face()
        with BuildLine():
            Line((9.920419, 27.457222), (12.343387, 25.688259))
            ThreePointArc((12.343387, 25.688259), (11.146328, 26.592498), (9.920419, 27.457222))
        make_face()
        with BuildLine():
            Line((-49.551259, 20.885851), (-20.880226, 6.239615))
            ThreePointArc((-20.880226, 6.239615), (-18.453909, 6.764267), (-15.977767, 6.940332))
            Line((-15.977767, 6.940332), (-47.430156, 23.007388))
            Line((-47.430156, 23.007388), (-49.551259, 20.885851))
        make_face()
        with BuildLine():
            ThreePointArc((-32.174304, -17.187051), (-32.996271, -14.636499), (-33.419188, -11.990353))
            Line((-33.419188, -11.990353), (-45.001782, -46.247293))
            Line((-45.001782, -46.247293), (-42.613842, -48.063262))
            Line((-42.613842, -48.063262), (-32.174304, -17.187051))
        make_face()
        with BuildLine():
            ThreePointArc((-47.430156, 23.007388), (-48.508007, 21.963916), (-49.551259, 20.885851))
            Line((-49.551259, 20.885851), (-47.430156, 23.007388))
        make_face()
        with BuildLine():
            Line((-42.613842, -48.063262), (-45.001782, -46.247293))
            ThreePointArc((-45.001782, -46.247293), (-43.82262, -47.17475), (-42.613842, -48.063262))
        make_face()
    extrude(amount=F12_DEPTH)

    # F13 (on face) → F14 (cut)
    with BuildSketch(Plane(origin=(0, 0, 0), x_dir=(1, 0, 0), z_dir=(0, 0, -1))):
        with Locations((28.893428, 47.575925)):
            Circle(F13_R)
        with Locations((-53.599834, 55.02338)):
            Circle(F13_R)
        with Locations((-60.483862, 47.575925)):
            Circle(F13_R)
        with Locations((27.792761, -27.104519)):
            Circle(F13_R)
        with Locations((-59.352773, -27.413523)):
            Circle(F13_R)
        with Locations((-52.714072, -34.026481)):
            Circle(F13_R)
        with Locations((20.607447, -33.641927)):
            Circle(F13_R)
    extrude(amount=-F14_DEPTH, mode=Mode.SUBTRACT)


solid = f1.part
